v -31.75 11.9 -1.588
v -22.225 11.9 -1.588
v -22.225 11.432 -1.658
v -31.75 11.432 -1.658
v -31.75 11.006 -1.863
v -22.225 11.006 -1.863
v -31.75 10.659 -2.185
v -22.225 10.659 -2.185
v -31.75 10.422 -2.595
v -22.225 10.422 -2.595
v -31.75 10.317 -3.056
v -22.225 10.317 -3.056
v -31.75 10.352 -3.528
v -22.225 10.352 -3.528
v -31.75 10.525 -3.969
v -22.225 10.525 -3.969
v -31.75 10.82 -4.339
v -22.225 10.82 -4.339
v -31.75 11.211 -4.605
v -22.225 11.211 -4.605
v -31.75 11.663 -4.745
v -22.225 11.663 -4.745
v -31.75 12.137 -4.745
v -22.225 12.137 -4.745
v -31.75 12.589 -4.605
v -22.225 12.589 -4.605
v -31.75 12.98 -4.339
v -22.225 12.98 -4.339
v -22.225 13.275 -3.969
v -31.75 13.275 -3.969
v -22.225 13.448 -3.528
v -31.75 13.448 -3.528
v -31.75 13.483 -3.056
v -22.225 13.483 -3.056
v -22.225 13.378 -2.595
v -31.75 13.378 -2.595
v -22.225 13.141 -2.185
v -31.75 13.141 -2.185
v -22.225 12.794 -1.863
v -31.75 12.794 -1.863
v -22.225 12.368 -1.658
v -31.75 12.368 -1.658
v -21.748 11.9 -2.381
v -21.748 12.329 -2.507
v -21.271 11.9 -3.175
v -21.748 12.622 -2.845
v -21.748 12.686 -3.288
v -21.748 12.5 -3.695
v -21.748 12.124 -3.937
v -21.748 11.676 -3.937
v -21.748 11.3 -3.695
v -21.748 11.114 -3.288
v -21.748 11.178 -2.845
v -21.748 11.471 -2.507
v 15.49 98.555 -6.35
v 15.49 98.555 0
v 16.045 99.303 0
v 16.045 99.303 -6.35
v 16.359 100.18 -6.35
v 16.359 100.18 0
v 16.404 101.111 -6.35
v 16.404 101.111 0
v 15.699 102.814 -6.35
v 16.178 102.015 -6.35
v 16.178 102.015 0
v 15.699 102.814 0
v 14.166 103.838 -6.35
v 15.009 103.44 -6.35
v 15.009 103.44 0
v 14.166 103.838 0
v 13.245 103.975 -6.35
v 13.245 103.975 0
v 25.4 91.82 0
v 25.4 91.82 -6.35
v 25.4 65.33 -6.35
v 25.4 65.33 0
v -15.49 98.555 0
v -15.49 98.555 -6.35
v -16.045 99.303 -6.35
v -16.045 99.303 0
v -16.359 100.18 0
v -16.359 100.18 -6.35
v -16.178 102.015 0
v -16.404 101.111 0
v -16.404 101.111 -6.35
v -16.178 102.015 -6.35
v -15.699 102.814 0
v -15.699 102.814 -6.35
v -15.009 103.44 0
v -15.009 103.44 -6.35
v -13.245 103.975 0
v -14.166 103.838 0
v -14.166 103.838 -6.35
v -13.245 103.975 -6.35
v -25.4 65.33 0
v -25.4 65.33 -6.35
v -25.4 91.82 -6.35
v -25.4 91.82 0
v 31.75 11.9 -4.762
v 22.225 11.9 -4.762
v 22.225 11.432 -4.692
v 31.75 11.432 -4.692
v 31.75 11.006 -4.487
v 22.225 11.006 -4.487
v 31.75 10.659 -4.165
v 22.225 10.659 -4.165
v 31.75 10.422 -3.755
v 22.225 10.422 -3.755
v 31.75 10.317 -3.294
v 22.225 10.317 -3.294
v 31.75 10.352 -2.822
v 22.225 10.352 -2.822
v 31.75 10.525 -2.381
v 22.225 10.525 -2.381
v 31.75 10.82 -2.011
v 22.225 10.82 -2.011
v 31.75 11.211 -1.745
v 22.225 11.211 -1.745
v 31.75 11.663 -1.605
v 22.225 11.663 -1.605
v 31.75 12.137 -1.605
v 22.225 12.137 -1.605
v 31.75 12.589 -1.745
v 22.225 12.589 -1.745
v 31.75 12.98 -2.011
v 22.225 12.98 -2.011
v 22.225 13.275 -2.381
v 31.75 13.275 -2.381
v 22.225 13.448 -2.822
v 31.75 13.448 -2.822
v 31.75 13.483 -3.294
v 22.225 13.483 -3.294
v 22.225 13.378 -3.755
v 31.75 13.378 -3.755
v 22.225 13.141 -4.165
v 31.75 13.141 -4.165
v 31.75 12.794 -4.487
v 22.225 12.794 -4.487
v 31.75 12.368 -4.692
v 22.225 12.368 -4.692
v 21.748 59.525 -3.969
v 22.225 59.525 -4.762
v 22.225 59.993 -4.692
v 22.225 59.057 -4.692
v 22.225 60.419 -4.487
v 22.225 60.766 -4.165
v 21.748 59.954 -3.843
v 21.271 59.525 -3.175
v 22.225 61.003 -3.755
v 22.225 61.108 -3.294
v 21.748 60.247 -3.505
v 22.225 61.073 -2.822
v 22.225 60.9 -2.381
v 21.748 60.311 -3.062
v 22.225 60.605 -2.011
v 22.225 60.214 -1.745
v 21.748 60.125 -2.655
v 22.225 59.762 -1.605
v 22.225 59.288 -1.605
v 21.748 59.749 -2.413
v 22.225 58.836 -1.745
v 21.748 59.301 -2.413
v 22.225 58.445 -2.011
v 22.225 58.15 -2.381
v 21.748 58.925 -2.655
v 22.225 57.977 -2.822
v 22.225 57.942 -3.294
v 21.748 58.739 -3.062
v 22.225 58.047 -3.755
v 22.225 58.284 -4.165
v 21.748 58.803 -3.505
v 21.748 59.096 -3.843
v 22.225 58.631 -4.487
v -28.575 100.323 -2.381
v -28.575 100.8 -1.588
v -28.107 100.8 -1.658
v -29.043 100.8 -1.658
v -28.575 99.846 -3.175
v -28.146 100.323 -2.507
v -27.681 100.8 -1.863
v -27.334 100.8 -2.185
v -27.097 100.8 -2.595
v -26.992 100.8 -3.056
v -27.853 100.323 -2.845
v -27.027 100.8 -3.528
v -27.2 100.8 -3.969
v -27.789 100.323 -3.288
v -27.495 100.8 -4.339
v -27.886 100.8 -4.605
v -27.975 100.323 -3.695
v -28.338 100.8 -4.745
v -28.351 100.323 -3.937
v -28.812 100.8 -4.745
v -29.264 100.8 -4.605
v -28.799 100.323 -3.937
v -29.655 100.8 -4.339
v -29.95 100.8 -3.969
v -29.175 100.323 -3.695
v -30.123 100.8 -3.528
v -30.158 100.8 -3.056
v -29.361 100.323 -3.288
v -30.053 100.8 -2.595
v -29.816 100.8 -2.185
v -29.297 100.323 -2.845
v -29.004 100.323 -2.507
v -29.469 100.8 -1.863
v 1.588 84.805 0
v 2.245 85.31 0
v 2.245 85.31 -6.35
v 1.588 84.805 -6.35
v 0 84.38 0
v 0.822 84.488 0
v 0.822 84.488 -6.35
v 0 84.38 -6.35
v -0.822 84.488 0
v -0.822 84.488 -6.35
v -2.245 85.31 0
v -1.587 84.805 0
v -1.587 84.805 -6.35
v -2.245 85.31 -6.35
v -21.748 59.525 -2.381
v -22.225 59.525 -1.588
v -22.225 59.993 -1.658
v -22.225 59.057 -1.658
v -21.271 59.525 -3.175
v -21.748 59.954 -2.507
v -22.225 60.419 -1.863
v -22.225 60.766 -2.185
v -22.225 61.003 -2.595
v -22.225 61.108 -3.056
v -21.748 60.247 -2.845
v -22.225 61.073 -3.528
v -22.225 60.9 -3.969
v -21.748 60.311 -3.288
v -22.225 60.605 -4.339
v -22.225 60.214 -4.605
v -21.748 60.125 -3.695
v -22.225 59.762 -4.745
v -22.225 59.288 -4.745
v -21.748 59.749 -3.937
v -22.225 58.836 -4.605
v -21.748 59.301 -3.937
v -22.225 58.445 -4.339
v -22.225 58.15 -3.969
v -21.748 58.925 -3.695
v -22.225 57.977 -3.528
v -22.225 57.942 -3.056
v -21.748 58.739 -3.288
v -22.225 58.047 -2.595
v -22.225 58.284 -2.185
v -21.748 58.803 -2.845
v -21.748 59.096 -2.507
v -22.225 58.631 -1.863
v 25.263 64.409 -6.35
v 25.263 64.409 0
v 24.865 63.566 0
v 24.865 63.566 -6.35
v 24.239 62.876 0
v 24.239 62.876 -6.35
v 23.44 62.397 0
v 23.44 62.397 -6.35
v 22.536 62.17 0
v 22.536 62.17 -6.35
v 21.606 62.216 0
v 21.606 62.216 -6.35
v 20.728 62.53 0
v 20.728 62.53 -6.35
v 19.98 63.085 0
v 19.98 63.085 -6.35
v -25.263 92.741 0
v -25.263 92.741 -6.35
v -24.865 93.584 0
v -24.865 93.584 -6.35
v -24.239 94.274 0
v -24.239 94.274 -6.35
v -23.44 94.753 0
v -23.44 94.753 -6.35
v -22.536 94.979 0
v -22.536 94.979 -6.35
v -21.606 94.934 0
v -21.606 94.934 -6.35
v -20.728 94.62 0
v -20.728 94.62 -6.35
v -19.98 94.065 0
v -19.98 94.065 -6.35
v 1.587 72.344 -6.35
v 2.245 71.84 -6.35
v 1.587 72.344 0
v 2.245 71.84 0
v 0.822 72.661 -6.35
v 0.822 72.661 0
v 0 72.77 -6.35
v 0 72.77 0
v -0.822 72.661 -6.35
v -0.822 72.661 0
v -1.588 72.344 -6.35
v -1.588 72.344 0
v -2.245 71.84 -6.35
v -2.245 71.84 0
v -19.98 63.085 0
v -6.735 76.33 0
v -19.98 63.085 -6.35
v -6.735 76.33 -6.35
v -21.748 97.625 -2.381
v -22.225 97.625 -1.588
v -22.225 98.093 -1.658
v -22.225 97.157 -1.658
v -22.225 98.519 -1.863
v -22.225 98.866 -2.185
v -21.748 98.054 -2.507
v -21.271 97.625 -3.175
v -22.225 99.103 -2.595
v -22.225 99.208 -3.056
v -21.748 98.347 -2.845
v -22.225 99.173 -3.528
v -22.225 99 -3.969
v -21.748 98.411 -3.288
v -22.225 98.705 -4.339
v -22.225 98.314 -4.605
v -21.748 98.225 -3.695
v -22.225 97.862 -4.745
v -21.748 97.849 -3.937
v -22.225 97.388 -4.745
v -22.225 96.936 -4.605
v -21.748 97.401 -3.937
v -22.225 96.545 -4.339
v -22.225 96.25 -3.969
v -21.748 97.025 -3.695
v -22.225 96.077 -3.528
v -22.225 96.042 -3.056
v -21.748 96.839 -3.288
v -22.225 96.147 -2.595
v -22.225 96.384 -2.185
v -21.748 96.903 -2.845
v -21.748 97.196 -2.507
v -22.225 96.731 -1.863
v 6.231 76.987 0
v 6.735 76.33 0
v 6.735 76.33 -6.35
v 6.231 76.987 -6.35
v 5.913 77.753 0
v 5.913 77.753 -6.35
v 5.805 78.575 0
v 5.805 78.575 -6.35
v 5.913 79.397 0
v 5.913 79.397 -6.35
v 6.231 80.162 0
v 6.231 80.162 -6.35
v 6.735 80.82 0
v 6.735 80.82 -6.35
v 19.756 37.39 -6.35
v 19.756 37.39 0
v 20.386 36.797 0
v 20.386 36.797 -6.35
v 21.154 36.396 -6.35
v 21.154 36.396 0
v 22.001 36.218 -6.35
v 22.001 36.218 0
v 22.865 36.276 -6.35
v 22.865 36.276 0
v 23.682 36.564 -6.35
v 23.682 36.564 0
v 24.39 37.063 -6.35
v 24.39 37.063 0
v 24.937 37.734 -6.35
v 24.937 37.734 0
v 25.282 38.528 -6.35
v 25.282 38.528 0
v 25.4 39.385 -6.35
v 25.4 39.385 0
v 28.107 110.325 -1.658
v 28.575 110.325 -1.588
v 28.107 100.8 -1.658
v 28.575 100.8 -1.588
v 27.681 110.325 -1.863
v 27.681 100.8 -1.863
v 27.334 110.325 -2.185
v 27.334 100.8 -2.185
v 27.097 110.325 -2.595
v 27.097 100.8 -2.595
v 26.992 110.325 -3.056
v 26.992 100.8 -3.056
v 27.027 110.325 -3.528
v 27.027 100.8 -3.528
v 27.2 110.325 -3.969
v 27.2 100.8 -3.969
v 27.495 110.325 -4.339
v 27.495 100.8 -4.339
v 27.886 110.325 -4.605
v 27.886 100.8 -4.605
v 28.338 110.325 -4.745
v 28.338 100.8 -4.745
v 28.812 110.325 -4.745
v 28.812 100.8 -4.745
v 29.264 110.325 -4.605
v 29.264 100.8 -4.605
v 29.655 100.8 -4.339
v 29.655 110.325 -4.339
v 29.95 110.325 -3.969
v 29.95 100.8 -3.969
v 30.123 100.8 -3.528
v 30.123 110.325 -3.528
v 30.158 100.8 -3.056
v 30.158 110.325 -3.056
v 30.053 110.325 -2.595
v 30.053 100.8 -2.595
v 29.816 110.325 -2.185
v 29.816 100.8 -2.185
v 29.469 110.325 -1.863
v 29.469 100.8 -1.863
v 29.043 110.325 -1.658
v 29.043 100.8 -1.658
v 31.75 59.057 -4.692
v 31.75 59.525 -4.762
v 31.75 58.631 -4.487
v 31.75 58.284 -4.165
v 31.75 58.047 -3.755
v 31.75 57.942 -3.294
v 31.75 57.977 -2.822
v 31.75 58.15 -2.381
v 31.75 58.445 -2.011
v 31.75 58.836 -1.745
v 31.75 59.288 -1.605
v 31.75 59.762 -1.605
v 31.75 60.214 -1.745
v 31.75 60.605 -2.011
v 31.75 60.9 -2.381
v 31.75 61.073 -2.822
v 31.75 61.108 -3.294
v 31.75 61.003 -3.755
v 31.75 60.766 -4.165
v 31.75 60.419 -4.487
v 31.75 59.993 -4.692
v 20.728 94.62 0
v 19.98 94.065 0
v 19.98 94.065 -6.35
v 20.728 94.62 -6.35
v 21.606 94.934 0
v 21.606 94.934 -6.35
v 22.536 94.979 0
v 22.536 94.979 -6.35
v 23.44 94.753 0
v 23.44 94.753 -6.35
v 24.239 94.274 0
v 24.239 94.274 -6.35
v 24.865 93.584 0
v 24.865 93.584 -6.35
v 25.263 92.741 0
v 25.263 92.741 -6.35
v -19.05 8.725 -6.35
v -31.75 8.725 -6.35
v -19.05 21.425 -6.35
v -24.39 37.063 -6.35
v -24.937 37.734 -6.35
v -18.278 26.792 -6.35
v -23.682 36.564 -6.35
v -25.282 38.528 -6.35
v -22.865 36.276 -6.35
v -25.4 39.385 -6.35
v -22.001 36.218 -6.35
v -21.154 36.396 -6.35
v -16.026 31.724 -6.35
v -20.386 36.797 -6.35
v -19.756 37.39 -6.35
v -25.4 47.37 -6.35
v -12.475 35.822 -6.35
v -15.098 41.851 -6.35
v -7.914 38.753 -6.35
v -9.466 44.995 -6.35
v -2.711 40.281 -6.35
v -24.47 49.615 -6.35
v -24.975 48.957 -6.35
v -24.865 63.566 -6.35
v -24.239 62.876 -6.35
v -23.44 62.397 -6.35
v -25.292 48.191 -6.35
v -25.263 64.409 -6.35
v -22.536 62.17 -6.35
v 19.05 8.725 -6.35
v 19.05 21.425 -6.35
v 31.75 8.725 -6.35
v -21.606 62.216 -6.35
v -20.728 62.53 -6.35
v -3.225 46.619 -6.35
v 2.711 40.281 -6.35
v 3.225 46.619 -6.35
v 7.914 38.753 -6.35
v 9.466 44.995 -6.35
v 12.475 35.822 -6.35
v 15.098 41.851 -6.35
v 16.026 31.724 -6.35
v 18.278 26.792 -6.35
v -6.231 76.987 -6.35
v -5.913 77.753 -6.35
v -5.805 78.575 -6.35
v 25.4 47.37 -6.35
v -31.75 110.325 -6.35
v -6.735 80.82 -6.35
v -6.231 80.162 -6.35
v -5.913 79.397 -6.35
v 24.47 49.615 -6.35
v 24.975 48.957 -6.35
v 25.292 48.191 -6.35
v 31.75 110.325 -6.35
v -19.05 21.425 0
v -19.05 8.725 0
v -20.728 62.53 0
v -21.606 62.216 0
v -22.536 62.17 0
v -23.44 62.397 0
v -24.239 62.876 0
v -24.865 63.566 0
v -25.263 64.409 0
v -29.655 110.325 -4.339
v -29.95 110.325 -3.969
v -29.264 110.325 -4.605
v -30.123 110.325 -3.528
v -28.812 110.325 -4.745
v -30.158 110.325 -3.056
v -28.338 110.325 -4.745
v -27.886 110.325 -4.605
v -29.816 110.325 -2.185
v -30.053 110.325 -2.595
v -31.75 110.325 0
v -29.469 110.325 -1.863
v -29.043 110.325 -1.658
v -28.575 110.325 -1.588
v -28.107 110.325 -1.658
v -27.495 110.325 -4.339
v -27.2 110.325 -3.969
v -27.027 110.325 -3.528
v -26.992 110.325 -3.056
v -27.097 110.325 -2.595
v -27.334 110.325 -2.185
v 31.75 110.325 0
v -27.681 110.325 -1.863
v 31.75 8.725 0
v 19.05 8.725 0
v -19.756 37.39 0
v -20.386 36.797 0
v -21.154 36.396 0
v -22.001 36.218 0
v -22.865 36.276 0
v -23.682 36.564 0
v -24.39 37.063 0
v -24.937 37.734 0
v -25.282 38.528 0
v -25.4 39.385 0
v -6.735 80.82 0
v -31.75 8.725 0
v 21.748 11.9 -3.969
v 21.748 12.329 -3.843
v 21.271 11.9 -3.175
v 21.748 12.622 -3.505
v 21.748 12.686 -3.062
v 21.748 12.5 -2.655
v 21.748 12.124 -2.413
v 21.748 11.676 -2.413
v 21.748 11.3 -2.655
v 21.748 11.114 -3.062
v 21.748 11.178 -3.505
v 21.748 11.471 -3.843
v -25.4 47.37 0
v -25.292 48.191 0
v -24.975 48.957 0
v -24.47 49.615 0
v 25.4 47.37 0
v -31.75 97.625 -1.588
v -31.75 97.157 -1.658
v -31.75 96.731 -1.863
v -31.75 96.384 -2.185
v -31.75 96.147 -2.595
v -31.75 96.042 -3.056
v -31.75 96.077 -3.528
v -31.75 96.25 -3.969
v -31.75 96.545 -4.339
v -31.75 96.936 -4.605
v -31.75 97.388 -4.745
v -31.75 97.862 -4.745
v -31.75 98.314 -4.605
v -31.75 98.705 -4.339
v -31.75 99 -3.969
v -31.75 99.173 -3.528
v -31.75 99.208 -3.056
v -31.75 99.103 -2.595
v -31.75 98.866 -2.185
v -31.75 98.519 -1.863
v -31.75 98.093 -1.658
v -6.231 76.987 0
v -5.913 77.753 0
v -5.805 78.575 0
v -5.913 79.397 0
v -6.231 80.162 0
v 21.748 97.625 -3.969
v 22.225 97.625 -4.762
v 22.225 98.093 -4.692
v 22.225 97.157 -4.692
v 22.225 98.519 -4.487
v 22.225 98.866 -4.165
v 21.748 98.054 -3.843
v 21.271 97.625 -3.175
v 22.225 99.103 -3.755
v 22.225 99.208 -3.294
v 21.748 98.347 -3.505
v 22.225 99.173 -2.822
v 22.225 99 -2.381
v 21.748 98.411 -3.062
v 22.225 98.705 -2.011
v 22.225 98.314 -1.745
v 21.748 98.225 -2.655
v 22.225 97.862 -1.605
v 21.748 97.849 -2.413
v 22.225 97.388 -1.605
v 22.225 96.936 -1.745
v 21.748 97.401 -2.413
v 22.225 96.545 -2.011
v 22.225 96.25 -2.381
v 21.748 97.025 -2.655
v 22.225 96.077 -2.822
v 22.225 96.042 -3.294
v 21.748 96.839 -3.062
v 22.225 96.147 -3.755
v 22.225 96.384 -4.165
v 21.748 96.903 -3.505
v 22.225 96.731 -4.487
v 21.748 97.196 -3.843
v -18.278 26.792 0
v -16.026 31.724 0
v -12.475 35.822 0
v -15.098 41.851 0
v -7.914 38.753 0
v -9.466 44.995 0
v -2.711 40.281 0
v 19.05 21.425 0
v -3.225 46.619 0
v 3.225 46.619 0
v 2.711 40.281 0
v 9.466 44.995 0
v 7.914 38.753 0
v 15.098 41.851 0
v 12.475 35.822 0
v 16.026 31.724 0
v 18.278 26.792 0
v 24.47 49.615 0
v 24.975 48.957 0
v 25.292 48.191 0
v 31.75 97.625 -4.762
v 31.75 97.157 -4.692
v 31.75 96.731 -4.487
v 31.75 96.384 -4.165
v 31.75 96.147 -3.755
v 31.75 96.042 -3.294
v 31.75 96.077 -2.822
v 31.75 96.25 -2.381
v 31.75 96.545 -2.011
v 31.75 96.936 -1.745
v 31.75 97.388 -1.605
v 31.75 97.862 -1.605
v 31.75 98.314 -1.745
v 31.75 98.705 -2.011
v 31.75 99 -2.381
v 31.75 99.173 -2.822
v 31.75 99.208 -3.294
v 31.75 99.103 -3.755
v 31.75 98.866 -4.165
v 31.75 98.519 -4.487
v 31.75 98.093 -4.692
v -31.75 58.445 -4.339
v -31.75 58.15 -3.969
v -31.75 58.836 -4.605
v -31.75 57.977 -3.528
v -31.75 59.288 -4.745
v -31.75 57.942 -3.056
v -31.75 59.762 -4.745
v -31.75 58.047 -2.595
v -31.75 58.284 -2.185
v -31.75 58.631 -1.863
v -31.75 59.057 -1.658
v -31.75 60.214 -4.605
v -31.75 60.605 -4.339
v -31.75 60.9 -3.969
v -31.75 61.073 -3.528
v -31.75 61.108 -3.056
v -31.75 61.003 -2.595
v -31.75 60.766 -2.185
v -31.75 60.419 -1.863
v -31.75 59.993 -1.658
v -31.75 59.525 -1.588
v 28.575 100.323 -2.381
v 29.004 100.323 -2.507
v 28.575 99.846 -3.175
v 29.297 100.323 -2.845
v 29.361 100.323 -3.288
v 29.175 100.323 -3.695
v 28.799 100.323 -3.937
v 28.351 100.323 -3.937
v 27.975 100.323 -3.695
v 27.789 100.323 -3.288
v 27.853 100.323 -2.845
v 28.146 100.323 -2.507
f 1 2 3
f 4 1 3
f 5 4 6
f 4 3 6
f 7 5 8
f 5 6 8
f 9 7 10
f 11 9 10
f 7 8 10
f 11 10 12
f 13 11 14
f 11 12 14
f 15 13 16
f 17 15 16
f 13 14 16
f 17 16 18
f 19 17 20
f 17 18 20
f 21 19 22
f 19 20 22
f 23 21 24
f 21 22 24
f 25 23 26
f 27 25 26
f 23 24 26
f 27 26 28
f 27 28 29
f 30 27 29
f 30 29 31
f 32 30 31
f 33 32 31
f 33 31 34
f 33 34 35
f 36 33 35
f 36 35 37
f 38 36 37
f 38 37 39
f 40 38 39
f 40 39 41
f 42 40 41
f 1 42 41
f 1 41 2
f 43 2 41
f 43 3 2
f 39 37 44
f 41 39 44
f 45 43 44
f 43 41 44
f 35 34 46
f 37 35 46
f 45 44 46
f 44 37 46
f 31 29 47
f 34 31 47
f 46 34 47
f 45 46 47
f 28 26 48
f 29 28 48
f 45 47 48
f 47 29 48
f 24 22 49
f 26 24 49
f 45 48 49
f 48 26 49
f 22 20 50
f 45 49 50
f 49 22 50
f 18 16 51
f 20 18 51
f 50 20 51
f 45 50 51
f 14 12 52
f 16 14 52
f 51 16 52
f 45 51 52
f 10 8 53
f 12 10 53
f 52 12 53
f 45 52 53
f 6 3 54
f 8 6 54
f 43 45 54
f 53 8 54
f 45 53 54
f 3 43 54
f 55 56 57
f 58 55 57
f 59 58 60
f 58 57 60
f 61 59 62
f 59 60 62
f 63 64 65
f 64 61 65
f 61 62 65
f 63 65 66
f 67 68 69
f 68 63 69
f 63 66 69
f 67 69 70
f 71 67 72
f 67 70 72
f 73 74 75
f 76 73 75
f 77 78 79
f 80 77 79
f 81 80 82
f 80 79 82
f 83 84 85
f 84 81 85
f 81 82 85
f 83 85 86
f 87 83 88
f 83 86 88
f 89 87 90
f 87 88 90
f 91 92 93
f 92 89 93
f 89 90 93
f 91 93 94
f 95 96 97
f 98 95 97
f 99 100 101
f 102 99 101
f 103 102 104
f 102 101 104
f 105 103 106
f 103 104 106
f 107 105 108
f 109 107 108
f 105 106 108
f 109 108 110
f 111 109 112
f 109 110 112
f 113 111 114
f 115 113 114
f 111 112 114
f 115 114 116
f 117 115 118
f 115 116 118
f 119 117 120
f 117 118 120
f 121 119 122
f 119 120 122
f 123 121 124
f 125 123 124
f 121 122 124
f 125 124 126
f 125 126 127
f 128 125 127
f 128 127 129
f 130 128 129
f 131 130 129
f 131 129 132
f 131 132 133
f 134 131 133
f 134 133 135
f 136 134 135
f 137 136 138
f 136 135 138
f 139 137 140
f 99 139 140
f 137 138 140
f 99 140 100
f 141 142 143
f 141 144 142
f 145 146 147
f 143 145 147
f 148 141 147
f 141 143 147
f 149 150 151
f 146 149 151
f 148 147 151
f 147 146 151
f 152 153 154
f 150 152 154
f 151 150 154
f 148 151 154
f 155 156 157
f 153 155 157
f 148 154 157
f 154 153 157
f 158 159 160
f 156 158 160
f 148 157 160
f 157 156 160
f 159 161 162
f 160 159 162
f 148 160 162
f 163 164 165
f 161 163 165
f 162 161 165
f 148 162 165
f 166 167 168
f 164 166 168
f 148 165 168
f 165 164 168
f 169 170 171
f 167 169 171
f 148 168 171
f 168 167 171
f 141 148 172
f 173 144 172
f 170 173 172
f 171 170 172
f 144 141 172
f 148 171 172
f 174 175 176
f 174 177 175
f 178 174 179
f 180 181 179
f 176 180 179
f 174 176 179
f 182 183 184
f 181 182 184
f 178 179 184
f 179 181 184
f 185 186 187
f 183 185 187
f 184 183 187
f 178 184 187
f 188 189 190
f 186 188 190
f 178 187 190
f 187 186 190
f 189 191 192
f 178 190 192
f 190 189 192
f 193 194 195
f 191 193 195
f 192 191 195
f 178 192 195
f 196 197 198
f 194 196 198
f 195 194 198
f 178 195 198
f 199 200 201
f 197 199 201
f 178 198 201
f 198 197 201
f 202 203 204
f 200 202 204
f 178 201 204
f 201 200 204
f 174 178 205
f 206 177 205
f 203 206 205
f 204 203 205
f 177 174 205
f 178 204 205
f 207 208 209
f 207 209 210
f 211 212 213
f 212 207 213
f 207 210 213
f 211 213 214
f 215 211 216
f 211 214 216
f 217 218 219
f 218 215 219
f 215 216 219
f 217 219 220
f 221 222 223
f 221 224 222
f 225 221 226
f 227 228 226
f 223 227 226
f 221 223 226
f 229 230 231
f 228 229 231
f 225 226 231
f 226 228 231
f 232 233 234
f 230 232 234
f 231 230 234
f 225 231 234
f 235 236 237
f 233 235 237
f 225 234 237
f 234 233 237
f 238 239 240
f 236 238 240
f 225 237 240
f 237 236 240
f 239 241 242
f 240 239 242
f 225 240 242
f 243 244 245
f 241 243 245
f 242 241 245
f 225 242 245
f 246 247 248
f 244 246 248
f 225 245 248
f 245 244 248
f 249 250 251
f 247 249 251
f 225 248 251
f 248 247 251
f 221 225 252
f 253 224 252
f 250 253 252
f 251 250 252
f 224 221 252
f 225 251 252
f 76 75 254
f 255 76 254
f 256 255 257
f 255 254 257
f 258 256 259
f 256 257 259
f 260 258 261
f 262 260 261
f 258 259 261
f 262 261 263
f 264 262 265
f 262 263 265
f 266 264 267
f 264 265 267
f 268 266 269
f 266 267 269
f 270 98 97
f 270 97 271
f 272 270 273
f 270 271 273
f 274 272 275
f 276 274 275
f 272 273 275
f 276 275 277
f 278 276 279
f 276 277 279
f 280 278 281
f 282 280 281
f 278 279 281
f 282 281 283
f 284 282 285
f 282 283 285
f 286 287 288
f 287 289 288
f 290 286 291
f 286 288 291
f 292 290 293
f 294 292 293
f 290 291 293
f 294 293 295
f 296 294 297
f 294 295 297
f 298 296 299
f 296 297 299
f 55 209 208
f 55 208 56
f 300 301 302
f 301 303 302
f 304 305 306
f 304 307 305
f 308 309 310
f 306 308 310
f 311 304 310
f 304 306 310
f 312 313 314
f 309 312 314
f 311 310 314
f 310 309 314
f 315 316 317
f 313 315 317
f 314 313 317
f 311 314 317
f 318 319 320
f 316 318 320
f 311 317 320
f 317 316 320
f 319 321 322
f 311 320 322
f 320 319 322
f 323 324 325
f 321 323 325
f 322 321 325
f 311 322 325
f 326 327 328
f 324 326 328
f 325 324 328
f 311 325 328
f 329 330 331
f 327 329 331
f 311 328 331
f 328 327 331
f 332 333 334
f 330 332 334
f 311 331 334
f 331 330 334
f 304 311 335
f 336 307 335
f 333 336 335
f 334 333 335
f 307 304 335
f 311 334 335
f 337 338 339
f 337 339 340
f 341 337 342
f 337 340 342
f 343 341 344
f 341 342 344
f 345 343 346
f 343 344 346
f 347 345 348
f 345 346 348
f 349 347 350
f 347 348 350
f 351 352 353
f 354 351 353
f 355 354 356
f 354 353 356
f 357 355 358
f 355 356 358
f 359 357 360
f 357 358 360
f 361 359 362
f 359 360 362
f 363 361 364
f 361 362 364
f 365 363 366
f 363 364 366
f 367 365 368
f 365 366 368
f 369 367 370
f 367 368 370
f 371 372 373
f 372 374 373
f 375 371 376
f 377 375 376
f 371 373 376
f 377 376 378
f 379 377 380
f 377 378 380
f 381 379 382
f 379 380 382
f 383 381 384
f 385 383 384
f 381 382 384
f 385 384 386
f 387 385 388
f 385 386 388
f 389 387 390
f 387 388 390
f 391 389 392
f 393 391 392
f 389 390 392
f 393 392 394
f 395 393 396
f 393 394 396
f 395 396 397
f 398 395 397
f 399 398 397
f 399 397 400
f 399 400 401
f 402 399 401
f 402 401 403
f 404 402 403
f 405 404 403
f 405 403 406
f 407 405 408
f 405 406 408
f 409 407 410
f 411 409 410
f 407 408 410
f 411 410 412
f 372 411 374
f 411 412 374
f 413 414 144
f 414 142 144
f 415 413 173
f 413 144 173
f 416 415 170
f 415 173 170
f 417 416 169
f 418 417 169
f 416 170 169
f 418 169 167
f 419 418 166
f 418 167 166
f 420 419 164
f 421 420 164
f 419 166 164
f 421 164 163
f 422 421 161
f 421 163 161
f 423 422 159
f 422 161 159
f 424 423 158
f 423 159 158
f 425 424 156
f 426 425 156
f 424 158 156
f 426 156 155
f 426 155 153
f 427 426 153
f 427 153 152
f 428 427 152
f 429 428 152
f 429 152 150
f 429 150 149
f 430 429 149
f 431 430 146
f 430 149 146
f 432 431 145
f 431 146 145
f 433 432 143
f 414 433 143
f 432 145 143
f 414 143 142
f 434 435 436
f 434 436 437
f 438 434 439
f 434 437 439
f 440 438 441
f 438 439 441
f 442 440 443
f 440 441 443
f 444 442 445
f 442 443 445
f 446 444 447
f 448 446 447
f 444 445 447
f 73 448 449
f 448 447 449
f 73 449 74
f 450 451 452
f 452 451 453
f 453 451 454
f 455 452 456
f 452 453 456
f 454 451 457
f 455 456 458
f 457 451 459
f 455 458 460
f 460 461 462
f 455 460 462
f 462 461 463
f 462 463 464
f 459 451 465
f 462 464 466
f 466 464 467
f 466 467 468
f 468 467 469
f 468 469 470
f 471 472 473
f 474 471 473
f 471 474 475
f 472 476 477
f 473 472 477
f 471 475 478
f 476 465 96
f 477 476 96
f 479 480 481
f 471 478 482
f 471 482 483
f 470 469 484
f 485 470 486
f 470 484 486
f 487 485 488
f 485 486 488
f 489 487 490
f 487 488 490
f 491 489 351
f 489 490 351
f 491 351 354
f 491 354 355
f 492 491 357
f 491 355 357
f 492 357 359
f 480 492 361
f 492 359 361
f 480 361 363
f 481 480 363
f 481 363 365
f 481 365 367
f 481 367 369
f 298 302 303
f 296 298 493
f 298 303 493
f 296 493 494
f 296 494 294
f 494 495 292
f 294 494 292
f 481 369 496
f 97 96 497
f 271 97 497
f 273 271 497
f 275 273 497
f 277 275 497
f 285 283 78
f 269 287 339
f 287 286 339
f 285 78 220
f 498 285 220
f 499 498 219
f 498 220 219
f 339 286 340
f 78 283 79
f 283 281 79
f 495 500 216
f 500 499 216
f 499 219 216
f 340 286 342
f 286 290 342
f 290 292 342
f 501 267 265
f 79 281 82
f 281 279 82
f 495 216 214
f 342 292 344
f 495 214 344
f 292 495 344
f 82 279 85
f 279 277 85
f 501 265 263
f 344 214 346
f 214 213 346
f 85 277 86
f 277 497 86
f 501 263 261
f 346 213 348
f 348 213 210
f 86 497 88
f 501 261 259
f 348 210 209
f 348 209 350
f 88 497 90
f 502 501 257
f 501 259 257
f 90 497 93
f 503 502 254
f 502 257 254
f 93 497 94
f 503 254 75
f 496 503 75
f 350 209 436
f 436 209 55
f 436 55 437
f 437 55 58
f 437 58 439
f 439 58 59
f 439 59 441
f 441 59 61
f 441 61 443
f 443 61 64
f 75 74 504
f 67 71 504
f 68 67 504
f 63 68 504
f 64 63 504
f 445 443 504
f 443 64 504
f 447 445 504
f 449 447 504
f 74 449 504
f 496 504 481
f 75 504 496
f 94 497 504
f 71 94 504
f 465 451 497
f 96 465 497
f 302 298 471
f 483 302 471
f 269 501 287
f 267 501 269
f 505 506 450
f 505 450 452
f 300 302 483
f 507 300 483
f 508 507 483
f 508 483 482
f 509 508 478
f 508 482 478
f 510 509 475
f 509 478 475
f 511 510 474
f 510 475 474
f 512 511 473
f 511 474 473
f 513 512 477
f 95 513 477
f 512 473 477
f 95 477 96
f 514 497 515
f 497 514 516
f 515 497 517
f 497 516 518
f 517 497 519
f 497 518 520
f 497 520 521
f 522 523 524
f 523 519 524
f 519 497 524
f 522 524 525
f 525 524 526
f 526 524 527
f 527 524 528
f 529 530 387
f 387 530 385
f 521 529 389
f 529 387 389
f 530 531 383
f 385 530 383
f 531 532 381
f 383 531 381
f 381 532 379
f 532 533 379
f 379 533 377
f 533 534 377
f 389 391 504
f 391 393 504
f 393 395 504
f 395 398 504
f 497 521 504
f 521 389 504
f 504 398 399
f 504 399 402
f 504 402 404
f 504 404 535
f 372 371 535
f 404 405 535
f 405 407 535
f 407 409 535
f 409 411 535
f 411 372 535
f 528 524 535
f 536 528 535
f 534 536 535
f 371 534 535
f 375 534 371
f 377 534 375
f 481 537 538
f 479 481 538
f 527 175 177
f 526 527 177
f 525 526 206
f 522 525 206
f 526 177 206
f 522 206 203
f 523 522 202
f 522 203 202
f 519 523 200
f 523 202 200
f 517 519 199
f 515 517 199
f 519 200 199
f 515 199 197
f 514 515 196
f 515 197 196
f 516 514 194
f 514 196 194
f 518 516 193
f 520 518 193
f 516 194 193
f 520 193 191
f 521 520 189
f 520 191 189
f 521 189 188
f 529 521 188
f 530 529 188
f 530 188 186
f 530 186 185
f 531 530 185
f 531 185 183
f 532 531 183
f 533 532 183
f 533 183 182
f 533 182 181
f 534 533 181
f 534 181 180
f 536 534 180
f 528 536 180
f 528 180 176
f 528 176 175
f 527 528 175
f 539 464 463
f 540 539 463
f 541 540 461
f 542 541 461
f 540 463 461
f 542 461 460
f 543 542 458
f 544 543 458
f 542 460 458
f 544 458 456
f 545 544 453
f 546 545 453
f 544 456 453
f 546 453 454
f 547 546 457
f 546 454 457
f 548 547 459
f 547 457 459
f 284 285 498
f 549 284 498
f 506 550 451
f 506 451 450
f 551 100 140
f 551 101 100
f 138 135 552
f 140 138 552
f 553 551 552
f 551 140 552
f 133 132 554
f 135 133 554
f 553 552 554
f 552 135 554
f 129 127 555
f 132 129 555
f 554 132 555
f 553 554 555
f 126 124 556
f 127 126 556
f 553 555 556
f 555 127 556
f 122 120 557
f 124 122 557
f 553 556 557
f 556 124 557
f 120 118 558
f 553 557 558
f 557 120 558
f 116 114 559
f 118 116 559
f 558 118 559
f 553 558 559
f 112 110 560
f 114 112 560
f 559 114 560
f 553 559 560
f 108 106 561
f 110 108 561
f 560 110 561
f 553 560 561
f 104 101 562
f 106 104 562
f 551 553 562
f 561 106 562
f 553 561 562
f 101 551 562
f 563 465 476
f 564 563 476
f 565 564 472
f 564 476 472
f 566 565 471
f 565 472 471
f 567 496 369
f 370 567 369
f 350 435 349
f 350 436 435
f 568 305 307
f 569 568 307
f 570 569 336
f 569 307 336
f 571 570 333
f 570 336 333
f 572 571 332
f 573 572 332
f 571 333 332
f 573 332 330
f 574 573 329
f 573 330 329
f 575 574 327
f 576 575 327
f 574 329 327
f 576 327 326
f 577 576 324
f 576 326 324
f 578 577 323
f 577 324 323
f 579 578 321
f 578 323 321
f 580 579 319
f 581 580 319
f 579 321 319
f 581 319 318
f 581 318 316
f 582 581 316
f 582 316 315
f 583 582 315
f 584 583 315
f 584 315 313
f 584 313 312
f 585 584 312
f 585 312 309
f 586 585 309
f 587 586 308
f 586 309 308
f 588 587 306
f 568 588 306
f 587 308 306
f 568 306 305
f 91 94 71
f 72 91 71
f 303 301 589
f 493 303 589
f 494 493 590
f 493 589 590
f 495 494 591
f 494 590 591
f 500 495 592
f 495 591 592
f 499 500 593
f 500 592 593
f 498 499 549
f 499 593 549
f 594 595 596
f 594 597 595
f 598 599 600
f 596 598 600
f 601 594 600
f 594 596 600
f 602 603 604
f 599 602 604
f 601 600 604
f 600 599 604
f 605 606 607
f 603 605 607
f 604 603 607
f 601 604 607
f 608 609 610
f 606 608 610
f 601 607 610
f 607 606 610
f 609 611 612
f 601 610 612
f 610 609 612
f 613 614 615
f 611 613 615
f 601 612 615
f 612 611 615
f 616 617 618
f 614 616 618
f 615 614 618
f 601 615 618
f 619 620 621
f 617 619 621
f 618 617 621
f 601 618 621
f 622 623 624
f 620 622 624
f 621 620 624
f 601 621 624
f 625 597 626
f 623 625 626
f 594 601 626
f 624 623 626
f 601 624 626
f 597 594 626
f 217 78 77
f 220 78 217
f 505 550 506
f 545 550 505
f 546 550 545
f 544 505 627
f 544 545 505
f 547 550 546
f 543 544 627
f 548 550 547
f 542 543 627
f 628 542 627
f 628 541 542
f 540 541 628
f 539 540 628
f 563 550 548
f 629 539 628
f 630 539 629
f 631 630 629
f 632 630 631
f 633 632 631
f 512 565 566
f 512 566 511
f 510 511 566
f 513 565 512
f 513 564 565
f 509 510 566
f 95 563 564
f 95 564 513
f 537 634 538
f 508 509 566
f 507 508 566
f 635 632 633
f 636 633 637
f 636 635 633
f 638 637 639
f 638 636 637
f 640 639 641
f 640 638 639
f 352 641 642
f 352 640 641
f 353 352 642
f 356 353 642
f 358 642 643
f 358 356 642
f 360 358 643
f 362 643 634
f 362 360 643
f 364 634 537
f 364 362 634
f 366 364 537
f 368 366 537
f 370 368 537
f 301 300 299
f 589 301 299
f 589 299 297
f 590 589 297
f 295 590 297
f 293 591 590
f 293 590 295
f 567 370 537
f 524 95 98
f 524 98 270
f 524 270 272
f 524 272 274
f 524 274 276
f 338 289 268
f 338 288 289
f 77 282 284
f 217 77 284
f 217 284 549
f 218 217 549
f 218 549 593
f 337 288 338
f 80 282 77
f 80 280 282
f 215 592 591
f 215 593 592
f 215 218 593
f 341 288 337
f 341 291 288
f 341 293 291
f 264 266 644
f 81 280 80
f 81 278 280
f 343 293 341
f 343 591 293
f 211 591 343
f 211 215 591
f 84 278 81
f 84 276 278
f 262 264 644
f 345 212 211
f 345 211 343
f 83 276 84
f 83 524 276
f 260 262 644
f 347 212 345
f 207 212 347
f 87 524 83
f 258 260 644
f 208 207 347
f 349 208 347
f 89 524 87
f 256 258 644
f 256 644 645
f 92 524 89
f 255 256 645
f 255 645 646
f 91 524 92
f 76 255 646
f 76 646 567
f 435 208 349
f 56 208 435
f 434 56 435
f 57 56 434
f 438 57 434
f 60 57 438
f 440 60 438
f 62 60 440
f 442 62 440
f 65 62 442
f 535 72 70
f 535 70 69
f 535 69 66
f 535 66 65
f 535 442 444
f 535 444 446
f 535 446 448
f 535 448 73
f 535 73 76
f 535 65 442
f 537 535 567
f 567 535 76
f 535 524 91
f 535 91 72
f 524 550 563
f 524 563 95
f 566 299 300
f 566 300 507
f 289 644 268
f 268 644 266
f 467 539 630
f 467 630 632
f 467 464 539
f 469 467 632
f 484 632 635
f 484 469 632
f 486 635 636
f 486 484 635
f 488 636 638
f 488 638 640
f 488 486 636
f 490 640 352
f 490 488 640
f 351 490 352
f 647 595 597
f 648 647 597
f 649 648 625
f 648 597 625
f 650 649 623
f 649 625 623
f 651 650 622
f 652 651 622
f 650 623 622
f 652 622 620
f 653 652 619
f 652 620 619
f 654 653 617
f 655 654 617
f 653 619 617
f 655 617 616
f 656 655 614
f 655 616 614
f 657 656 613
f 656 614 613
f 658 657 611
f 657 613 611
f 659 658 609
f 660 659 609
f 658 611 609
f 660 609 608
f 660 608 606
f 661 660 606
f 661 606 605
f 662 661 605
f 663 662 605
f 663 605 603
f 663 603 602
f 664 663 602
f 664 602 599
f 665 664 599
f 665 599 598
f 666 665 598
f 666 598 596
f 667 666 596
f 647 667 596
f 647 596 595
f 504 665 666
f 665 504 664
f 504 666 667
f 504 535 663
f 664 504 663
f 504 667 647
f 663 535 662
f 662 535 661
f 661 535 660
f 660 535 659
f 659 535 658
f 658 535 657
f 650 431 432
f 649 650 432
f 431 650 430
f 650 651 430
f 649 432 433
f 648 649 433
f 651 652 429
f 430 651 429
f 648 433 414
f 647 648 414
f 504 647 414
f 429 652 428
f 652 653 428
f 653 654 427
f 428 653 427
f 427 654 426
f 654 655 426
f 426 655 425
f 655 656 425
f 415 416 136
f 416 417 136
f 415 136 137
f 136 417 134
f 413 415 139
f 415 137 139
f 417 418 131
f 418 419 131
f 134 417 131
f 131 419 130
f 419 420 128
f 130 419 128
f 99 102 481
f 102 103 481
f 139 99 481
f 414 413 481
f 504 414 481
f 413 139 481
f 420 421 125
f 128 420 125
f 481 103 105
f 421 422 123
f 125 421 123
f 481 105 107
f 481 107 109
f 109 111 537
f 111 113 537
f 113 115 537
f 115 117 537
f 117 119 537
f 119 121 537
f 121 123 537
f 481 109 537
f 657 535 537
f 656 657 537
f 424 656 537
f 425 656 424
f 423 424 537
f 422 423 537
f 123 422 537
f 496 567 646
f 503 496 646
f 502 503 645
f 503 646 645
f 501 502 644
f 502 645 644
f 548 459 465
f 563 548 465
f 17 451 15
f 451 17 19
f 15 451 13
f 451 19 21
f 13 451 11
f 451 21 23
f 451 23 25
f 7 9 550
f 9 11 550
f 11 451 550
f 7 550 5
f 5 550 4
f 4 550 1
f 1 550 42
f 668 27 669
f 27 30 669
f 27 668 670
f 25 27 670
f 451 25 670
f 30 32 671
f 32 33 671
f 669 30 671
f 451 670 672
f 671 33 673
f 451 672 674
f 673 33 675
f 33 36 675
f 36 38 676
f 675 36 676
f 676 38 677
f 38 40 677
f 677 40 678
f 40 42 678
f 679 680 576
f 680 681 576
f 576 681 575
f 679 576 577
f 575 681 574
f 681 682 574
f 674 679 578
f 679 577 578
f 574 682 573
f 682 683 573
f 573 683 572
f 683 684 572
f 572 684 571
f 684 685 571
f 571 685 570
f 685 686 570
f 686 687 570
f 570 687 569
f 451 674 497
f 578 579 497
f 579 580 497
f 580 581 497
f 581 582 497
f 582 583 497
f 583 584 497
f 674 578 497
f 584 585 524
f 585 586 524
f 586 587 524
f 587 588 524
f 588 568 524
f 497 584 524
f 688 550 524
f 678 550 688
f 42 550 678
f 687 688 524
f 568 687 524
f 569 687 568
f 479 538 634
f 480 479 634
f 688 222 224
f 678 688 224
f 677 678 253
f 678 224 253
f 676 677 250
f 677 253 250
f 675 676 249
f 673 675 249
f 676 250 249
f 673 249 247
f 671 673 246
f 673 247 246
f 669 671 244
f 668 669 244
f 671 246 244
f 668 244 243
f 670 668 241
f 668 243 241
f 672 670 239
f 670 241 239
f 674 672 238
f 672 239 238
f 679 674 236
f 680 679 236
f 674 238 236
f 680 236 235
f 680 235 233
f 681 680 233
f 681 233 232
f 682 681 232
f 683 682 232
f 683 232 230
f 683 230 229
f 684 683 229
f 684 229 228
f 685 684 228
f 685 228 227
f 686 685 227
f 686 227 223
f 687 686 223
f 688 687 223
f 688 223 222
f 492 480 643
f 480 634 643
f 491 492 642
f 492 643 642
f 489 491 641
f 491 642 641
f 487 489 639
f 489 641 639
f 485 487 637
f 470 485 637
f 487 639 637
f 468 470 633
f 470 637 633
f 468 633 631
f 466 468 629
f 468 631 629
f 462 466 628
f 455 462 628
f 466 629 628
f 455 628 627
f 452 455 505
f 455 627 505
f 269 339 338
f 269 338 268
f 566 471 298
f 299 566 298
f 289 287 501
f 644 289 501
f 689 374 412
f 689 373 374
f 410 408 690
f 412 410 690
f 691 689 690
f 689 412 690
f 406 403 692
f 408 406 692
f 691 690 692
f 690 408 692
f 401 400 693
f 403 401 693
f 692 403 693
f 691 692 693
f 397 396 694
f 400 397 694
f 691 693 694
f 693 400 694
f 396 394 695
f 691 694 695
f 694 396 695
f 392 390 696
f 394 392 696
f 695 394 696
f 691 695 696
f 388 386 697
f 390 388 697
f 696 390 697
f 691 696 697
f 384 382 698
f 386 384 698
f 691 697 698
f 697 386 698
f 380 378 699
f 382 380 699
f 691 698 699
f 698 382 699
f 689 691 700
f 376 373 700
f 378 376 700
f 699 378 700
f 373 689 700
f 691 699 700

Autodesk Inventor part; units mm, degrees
ref_plane "YZ Plane" through (0, 0, 0) normal (1, 0, 0) x (0, 1, 0)
ref_plane "XZ Plane" through (0, 0, 0) normal (0, 1, 0) x (-1, 0, 0)
sketch "Sketch1" plane through (0, 0, 0) normal (0, 0, 1) x (1, 0, 0)
  line L0 (-31.75, 110.3249) -> (31.75, 110.3249)
  line L1 (31.75, 110.3249) -> (31.75, 8.7249)
  line L2 (-31.75, 8.7249) -> (-31.75, 110.3249)
  line L3 (-31.75, 8.7249) -> (-19.05, 8.7249)
  line L4 (31.75, 8.7249) -> (19.05, 8.7249)
  line L5 (-19.05, 8.7249) -> (-19.05, 21.4249)
  line L6 (19.05, 8.7249) -> (19.05, 21.4249)
  arc A0 (19.05, 21.4249) -> (-19.05, 21.4249) centre (0, 21.4249) ccw
  point P0 (0, 0)
  dimension "d0" = 63.5
  dimension "d1" = 31.75
  dimension "d2" = 101.6
  dimension "d3" = 110.3249
  dimension "d4" = 12.7
  dimension "d5" = 12.7
  dimension "d46" = 101.6
  dimension "d52" = 12.7
  dimension "d53" = 12.7
extrude "Extrusion1" add sketch "Sketch1" against normal blind 6.35
sketch "Sketch2" plane through (31.75, 8.7249, 0) normal (1, 0, 0) x (0, 0, -1)
  line L0 (6.35, 0) -> (6.35, 101.6) projected
  line L1 (0, 101.6) -> (6.35, 101.6) projected
  line L2 (0, 101.6) -> (0, 0) projected
  line L3 (0, 0) -> (6.35, 0) projected
  point P0 (0, -8.7249)
  point P1 (3.175, 3.175)
  point P2 (3.175, 88.9)
  point P3 (3.175, 50.8)
  dimension "d22" = 12.7
  dimension "d23" = 3.175
  dimension "d24" = 3.175
  dimension "d25" = 3.175
  dimension "d54" = 50.8
  dimension "d55" = 3.175
hole "Hole2" at (31.75, 11.8999, -3.175) at (31.75, 97.6249, -3.175) at (31.75, 59.5249, -3.175) direction (-1, 0, 0) diameter 3.175 depth 9.525 tip angle 118
sketch "Sketch3" plane through (-31.75, 8.7249, 0) normal (-1, 0, 0) x (0, 0, 1)
  line L0 (0, 0) -> (-6.35, 0) projected
  line L1 (0, 0) -> (0, 101.6) projected
  line L2 (0, 101.6) -> (-6.35, 101.6) projected
  line L3 (-6.35, 101.6) -> (-6.35, 0) projected
  point P0 (0, -8.7249)
  point P1 (-3.175, 88.9)
  point P2 (-3.175, 3.175)
  point P3 (-3.175, 50.8)
  dimension "d33" = 3.175
  dimension "d34" = 12.7
  dimension "d35" = 3.175
  dimension "d36" = 3.175
  dimension "d56" = 50.8
  dimension "d57" = 3.175
hole "Hole3" at (-31.75, 97.6249, -3.175) at (-31.75, 11.8999, -3.175) at (-31.75, 59.5249, -3.175) direction (1, 0, 0) diameter 3.175 depth 9.525 tip angle 118
sketch "Sketch5" plane through (-31.75, 110.3249, 0) normal (0, 1, 0) x (1, 0, 0)
  line L0 (0, 0) -> (0, 6.35) projected
  line L1 (0, 0) -> (63.5, 0) projected
  line L2 (63.5, 0) -> (63.5, 6.35) projected
  point P0 (31.75, 0)
  point P1 (3.175, 3.175)
  point P2 (60.325, 3.175)
  dimension "d78" = 3.175
  dimension "d79" = 3.175
  dimension "d80" = 3.175
hole "Hole4" at (-28.575, 110.3249, -3.175) at (28.575, 110.3249, -3.175) direction (0, -1, 0) diameter 3.175 depth 9.525 tip angle 118
ref_plane "Work Plane2" through (0, 0, -3.175) normal (0, 0, 1) x (1, 0, 0)
sketch "Sketch6" plane through (0, 0, -3.175) normal (0, 0, 1) x (1, 0, 0)
  arc A0 (25.4, 21.4249) -> (-25.4, 21.4249) centre (0, 21.4249) ccw
  line L0 (-31.75, 110.3249) -> (-31.75, 8.7249) projected
  line L1 (31.75, 110.3249) -> (-31.75, 110.3249) projected
  line L2 (31.75, 8.7249) -> (31.75, 110.3249) projected
  line L3 (19.05, 8.7249) -> (31.75, 8.7249) projected
  arc A1 (19.05, 21.4249) -> (-19.05, 21.4249) centre (0, 21.4249) ccw projected
  line L4 (19.05, 21.4249) -> (19.05, 8.7249) projected
  line L5 (-19.05, 8.7249) -> (-19.05, 21.4249) projected
  line L6 (-31.75, 8.7249) -> (-19.05, 8.7249) projected
  line L7 (-25.4, 21.4249) -> (-25.4, 103.9749)
  line L8 (-25.4, 103.9749) -> (25.4, 103.9749)
  line L9 (25.4, 103.9749) -> (25.4, 21.4249)
  line L10 (25.4, 103.9749) -> (-25.4, 53.1749) construction
  line L11 (-25.4, 103.9749) -> (25.4, 53.1749) construction
  line L12 (-25.4, 99.4848) -> (-4.4901, 78.5749)
  line L13 (-4.4901, 78.5749) -> (-25.4, 57.665)
  line L14 (-20.9099, 103.9749) -> (0, 83.065)
  line L15 (0, 83.065) -> (20.9099, 103.9749)
  line L16 (25.4, 99.4848) -> (4.4901, 78.5749)
  line L17 (4.4901, 78.5749) -> (25.4, 57.665)
  line L18 (-25.4, 48.6848) -> (0, 74.0848)
  line L19 (0, 74.0848) -> (25.4, 48.6848)
  arc A2 (-25.4, 65.3302) -> (-19.9799, 63.0851) centre (-22.225, 65.3302) ccw
  arc A3 (-19.9799, 94.0647) -> (-25.4, 91.8196) centre (-22.225, 91.8196) ccw
  arc A4 (25.4, 91.8196) -> (19.9799, 94.0647) centre (22.225, 91.8196) ccw
  arc A5 (19.9799, 63.0851) -> (25.4, 65.3302) centre (22.225, 65.3302) ccw
  point P0 (0, 0)
  dimension "d99" = 25.4
  dimension "d100" = 6.35
  dimension "d101" = 6.35
  dimension "d102" = 6.35
  dimension "d103" = 45
  dimension "d104" = 6.35
  dimension "d105" = 3.175
  dimension "d106" = 3.175
  dimension "d108" = 6.35
  dimension "d109" = 3.175
  dimension "d110" = 6.35
  dimension "d111" = 3.175
  dimension "d112" = 6.35
  dimension "d113" = 3.175
  dimension "d114" = 3.175
  dimension "d115" = 3.175
  dimension "d116" = 3.175
extrude "Extrusion5" cut sketch "Sketch6" along normal mid plane 25.4 contours A0 L7 L18 L19 L9 | A5 L17 L16 A4 L9 | L7 A3 L12 L13 A2 | L15 L14 L8
fillet "Fillet3" radius 3.175 10 edges at (-25.4, 21.4249, -3.175) (25.4, 21.4249, -3.175) (25.4, 48.6848, -3.175) (0, 74.0848, -3.175) (-25.4, 48.6848, -3.175) (-4.4901, 78.5749, -3.175) (4.4901, 78.5749, -3.175) (0, 83.065, -3.175) (-20.9099, 103.9749, -3.175) (20.9099, 103.9749, -3.175)
equation "\"d105\" = 0.5 * d104"
equation "\"d106\" = d105"
equation "\"d109\" = d105"
equation "\"d110\" = d108"
equation "\"d111\" = d105"
equation "\"d112\" = d104"
properties part number "lower box front plate2"
